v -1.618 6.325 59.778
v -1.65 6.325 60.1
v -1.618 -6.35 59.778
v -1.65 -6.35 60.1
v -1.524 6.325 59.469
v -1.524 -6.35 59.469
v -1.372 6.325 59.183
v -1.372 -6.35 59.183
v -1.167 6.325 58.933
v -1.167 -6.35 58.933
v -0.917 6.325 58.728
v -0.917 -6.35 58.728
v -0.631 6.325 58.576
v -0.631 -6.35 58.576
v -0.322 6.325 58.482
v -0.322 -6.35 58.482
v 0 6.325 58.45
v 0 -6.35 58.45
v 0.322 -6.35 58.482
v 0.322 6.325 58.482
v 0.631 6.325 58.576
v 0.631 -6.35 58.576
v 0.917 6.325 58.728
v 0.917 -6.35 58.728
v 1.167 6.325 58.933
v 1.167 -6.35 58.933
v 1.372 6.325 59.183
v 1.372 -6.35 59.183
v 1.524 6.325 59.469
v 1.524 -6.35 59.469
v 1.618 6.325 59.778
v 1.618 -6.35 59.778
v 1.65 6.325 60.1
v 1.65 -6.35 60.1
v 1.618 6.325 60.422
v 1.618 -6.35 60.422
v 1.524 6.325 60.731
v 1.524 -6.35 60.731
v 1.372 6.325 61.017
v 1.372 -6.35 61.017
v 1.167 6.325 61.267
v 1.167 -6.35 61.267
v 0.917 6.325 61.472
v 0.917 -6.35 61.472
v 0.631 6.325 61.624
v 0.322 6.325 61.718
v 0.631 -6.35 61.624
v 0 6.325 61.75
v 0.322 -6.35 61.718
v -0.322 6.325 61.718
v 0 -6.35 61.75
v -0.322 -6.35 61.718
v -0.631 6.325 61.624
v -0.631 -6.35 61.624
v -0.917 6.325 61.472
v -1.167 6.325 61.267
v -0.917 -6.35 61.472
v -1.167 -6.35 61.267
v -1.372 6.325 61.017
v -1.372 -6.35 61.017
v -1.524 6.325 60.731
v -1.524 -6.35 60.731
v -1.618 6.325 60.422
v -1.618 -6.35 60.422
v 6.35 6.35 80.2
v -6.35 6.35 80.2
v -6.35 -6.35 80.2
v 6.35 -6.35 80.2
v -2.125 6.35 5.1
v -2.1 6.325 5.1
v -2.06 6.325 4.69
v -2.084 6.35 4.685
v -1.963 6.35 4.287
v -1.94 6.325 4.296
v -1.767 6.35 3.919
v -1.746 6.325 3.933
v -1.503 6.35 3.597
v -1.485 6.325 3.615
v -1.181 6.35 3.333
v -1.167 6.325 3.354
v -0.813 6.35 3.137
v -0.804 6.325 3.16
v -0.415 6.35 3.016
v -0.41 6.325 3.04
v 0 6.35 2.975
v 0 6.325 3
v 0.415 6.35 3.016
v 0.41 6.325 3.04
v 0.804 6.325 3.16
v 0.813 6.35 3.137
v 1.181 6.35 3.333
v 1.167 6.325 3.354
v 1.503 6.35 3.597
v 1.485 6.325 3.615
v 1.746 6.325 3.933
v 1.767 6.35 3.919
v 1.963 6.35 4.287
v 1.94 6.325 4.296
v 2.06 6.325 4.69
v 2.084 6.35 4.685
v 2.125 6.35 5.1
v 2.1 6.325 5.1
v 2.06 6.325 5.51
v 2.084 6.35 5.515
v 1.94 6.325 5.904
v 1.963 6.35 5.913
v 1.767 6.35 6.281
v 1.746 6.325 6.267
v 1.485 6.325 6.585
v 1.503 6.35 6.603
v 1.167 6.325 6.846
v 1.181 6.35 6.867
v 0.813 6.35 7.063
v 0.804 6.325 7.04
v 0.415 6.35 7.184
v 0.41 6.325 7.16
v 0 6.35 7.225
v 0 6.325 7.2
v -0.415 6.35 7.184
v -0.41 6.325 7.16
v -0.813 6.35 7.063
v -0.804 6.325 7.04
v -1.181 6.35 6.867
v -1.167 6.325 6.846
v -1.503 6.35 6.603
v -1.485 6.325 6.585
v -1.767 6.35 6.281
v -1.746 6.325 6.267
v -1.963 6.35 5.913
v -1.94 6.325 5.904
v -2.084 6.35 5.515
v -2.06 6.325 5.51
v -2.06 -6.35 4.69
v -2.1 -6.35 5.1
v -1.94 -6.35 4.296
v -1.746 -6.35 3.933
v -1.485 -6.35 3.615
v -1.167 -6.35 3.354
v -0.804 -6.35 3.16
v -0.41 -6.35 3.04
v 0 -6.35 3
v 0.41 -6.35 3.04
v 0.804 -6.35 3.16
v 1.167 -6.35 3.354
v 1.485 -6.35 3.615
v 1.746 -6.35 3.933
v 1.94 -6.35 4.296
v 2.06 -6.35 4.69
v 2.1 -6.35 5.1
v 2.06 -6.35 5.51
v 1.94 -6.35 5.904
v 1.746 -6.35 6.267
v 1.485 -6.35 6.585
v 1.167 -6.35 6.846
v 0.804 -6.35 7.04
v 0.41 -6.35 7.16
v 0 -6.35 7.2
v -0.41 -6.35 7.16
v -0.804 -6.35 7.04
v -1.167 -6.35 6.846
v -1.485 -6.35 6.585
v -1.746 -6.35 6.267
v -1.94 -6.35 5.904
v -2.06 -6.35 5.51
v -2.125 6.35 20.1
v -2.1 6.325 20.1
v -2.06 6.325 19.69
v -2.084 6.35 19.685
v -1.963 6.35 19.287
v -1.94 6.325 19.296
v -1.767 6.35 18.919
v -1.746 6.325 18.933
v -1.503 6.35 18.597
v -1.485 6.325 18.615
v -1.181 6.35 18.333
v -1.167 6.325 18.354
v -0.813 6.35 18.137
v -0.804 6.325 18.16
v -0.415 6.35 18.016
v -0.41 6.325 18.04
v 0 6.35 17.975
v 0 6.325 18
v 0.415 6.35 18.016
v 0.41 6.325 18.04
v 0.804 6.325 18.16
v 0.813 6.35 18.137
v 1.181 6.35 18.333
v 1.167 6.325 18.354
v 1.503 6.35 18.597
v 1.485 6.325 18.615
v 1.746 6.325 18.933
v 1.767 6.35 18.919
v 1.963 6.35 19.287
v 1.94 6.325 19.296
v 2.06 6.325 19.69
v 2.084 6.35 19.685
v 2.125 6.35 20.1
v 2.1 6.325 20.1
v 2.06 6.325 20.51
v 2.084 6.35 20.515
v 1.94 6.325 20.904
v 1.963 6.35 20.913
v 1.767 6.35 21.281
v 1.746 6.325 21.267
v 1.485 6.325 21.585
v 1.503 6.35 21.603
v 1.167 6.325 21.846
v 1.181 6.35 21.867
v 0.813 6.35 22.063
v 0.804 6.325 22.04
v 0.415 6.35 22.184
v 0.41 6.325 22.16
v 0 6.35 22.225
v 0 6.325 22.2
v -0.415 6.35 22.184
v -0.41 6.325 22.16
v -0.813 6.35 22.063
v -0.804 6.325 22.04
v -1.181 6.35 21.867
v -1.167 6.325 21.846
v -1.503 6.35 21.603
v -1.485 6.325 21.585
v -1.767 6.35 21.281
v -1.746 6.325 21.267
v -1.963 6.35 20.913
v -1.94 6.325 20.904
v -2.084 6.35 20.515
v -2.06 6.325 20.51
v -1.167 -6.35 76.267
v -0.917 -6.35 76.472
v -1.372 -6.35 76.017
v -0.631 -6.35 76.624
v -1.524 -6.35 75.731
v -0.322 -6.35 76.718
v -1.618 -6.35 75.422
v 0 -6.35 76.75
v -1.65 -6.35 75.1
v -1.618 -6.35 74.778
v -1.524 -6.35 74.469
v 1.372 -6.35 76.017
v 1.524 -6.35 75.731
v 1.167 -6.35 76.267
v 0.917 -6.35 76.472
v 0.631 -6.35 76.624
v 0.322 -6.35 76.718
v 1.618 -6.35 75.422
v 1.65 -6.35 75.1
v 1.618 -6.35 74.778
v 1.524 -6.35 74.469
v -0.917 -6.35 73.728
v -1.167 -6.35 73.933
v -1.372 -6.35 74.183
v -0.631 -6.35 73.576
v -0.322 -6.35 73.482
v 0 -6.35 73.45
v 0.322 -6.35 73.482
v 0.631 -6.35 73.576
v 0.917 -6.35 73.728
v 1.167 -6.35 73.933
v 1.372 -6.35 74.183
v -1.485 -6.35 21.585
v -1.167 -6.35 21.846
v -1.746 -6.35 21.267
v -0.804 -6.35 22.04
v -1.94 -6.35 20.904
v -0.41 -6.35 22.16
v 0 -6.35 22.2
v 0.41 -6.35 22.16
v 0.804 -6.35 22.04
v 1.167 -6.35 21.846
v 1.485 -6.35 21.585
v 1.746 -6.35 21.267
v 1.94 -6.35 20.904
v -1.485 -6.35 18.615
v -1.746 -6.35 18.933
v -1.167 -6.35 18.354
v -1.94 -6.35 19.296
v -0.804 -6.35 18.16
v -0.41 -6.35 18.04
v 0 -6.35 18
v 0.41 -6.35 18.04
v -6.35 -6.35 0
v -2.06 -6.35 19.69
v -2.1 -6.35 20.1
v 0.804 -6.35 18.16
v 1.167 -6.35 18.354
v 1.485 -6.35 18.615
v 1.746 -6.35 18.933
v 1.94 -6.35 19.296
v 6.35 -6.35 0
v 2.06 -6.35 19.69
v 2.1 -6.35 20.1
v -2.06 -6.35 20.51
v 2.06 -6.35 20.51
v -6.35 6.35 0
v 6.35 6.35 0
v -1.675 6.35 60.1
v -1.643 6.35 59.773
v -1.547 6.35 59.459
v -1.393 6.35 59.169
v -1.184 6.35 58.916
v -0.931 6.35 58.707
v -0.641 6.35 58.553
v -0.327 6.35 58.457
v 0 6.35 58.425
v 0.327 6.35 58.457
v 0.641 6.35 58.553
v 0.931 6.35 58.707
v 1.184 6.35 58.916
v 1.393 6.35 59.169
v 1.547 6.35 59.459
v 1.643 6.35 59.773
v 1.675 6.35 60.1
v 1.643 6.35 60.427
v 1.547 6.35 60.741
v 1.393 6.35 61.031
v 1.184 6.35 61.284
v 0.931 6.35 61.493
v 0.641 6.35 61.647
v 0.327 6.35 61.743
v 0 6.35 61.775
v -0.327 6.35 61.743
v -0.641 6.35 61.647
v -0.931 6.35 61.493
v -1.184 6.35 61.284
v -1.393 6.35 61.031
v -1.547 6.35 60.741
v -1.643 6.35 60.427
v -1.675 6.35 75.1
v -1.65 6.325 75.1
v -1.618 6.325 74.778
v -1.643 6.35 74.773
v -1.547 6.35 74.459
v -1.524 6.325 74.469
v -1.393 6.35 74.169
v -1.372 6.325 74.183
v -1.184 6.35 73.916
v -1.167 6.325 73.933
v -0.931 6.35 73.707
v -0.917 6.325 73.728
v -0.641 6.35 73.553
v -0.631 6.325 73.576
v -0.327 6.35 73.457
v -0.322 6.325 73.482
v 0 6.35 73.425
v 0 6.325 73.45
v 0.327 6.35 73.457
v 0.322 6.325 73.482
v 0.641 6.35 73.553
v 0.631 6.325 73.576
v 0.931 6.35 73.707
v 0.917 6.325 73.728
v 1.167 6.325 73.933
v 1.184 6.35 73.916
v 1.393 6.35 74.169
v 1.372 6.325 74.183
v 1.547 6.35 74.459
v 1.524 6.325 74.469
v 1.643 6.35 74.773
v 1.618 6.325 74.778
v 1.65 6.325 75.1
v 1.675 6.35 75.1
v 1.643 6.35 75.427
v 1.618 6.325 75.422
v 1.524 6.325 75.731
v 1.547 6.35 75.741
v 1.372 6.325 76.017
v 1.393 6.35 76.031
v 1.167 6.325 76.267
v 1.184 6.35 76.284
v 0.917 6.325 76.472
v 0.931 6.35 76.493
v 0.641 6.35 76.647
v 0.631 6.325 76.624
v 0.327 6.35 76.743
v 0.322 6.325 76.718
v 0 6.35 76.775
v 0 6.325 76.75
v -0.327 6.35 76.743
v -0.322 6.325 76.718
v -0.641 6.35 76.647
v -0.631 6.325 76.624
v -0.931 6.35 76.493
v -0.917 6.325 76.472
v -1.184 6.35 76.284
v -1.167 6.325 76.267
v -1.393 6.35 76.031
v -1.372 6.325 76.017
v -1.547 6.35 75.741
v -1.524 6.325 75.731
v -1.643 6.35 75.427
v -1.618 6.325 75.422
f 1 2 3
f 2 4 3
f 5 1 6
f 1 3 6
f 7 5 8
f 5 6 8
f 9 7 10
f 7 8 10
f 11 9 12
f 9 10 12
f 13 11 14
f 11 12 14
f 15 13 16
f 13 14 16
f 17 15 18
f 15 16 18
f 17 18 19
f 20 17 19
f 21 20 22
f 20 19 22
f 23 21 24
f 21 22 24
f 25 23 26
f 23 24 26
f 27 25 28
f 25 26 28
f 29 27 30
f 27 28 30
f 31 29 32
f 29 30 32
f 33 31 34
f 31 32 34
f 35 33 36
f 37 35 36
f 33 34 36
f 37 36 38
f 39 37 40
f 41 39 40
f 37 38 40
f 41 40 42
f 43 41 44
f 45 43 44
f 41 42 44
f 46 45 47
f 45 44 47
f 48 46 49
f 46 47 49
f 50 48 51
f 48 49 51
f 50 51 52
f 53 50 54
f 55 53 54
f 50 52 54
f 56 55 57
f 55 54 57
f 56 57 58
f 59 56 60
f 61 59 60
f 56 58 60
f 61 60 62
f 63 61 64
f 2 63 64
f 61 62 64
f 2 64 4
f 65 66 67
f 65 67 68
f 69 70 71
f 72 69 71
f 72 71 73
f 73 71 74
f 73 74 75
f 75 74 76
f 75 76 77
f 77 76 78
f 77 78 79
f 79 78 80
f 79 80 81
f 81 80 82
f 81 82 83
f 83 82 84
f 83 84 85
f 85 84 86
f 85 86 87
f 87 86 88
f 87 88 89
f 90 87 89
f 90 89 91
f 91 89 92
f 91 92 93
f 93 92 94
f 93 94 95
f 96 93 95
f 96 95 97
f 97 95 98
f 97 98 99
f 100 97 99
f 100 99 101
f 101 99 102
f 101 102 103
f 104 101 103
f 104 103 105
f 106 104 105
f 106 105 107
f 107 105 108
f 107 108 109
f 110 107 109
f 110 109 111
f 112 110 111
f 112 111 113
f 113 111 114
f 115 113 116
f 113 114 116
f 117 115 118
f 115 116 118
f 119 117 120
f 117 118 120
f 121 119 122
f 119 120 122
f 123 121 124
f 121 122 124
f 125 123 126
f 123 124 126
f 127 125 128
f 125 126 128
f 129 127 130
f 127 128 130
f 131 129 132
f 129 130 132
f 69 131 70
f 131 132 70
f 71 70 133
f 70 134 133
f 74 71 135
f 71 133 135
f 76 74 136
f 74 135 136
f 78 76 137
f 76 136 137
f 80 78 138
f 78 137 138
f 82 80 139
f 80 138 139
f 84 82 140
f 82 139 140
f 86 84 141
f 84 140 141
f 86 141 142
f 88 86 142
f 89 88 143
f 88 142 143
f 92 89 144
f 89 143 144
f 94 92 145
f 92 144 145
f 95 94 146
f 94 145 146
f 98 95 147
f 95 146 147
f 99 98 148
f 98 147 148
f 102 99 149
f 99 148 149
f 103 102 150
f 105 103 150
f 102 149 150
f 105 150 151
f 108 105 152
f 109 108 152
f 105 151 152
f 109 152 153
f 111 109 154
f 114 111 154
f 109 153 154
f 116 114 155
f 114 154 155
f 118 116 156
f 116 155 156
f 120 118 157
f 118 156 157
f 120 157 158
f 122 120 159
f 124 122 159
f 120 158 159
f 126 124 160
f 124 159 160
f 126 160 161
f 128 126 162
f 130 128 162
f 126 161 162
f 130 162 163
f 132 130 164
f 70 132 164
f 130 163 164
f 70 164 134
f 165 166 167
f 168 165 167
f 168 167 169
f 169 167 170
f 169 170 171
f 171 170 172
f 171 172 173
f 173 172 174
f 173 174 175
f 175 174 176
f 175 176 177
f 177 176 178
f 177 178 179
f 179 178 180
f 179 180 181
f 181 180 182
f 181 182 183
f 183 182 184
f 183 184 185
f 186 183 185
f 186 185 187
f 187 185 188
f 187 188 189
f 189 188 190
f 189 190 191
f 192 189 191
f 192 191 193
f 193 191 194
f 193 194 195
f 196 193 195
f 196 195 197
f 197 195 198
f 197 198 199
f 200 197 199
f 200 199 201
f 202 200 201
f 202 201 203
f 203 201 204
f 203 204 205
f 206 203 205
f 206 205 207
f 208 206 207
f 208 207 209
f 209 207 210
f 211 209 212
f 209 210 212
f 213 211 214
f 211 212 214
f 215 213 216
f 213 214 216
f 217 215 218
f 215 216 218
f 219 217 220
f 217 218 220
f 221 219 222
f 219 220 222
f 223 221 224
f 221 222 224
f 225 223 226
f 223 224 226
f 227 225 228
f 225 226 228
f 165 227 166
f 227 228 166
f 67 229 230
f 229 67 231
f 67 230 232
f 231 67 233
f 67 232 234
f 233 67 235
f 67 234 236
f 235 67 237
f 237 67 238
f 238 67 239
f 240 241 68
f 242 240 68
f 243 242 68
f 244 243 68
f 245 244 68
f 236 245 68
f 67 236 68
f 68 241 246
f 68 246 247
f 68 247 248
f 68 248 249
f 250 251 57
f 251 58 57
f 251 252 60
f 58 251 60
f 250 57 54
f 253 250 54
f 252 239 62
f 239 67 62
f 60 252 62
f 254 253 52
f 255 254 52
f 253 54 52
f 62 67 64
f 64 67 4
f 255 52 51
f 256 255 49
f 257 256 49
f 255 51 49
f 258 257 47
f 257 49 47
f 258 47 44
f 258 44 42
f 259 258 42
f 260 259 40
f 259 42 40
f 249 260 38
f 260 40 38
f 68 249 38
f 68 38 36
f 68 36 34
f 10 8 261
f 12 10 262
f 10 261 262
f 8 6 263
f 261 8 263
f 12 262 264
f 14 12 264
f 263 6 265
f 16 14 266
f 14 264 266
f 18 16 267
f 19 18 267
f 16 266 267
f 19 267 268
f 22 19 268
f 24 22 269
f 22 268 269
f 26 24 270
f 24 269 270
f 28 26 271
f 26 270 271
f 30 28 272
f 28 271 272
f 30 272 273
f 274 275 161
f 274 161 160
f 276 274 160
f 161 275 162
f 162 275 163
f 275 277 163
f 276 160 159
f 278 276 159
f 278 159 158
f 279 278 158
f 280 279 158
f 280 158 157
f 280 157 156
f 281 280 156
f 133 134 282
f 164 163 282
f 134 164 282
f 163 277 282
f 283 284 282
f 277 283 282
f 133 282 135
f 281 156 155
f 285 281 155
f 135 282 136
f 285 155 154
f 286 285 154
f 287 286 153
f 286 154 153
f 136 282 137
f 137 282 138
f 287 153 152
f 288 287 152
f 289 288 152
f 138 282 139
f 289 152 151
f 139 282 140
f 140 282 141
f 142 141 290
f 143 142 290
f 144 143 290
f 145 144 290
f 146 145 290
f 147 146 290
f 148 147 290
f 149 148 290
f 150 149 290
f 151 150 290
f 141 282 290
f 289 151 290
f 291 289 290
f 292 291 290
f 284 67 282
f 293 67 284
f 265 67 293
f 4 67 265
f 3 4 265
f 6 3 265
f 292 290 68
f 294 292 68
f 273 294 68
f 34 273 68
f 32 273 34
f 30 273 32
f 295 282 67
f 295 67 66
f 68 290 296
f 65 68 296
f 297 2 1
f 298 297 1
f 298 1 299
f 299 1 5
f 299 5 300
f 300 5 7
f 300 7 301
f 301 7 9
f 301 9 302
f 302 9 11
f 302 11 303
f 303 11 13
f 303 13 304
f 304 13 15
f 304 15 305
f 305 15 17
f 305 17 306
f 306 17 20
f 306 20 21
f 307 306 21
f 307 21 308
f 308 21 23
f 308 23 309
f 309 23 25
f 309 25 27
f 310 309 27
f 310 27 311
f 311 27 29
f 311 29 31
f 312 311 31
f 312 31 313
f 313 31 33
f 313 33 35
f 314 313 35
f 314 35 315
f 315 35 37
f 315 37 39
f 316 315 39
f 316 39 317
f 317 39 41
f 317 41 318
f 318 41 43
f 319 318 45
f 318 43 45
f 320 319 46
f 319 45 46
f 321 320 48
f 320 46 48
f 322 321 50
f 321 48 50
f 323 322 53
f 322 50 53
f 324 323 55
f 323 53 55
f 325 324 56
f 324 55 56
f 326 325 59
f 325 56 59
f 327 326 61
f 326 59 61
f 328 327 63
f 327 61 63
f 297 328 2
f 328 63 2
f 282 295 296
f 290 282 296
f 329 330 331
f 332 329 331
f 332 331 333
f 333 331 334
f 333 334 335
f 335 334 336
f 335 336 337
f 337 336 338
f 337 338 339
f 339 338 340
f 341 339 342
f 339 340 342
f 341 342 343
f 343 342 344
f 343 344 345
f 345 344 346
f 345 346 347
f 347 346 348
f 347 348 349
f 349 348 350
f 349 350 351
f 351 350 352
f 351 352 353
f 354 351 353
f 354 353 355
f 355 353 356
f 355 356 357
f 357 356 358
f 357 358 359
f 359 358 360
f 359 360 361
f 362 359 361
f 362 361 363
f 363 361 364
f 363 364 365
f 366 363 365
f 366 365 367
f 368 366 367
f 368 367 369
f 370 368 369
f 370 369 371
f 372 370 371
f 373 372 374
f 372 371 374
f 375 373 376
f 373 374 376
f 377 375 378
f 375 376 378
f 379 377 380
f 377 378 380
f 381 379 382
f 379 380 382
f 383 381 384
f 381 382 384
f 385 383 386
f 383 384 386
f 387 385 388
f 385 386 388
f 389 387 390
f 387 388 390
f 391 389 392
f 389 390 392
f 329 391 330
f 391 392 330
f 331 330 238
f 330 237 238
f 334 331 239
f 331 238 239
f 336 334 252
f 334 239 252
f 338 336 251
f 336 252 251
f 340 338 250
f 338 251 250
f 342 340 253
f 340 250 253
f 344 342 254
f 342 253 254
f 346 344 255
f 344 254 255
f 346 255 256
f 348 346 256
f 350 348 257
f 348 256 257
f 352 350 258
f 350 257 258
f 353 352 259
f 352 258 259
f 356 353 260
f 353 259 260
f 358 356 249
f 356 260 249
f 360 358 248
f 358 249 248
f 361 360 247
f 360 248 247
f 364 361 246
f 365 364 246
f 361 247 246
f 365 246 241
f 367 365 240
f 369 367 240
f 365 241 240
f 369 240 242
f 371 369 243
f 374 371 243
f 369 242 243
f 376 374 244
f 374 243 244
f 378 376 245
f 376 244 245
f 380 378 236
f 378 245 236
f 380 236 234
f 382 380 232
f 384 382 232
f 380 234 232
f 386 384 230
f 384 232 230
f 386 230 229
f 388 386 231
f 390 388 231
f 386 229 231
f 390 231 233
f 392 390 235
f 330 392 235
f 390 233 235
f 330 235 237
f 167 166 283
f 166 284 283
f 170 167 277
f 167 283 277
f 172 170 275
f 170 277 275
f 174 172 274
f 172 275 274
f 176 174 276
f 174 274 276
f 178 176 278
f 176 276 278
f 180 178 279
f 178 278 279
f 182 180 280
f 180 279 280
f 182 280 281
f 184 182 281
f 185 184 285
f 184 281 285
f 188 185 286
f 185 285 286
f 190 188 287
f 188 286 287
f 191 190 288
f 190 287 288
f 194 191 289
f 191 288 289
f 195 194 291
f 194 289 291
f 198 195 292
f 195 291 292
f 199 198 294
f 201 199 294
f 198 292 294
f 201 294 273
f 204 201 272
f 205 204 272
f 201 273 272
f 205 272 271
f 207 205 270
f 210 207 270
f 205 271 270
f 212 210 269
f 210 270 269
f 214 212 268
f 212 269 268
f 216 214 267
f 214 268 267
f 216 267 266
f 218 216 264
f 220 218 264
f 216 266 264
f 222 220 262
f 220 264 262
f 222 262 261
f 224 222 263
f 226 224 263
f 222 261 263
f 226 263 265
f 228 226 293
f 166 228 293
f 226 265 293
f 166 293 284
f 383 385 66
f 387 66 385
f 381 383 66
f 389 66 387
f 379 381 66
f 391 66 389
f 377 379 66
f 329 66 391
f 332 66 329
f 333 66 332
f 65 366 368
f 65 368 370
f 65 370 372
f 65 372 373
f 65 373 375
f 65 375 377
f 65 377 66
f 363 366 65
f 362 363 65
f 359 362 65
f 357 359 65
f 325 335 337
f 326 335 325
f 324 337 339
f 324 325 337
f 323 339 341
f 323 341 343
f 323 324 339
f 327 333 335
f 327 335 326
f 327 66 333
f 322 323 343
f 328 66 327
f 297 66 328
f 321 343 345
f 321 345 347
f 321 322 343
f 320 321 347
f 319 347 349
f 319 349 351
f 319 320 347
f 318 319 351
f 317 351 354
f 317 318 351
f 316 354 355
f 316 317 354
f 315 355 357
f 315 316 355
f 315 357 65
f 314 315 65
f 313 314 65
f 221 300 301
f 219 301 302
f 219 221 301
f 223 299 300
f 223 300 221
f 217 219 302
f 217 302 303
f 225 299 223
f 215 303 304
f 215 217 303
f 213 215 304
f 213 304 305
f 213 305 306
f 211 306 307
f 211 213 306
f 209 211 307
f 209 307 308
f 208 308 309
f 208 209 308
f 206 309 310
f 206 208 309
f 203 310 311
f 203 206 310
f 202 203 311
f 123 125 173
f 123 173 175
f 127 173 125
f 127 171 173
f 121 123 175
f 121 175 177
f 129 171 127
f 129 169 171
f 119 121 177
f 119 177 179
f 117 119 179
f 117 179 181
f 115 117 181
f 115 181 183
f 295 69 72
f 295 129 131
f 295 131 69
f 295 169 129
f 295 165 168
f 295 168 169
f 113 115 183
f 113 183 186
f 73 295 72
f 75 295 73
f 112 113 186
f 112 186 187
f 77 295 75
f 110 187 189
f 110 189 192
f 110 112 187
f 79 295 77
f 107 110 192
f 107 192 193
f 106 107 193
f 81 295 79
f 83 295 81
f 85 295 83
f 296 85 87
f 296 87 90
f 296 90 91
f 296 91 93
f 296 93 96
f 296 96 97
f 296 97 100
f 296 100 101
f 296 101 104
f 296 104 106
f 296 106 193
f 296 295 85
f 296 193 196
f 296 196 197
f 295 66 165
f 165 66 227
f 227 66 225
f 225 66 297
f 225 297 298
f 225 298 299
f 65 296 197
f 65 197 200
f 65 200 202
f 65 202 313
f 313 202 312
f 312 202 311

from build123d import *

# Parameters (mm, degrees)
SKETCH_1_W                   = 12.7
SKETCH_1_H                   = 12.7
EXTRUDE_1_DEPTH              = 80.2
HOLE_WIZARD_M4_1_D           = 3.3
HOLE_WIZARD_M4_1_CSINK_D     = 3.35
HOLE_WIZARD_M4_1_CSINK_ANGLE = 90
HOLE_WIZARD_M5_1_D           = 4.2
HOLE_WIZARD_M5_1_CSINK_D     = 4.25
HOLE_WIZARD_M5_1_CSINK_ANGLE = 90


with BuildPart() as part:
    # 草圖1 → 填料-伸長1 (new body)
    with BuildSketch(Plane.XY):
        Rectangle(SKETCH_1_W, SKETCH_1_H)
    extrude(amount=EXTRUDE_1_DEPTH)

    # M4  螺絲攻的螺孔鑽1 (through all)
    with Locations(Plane(origin=(0, 6.35, 0), x_dir=(1, 0, 0), z_dir=(0, 1, 0))):
        with Locations((0, -60.1), (0, -75.1)):
            CounterSinkHole(HOLE_WIZARD_M4_1_D / 2, HOLE_WIZARD_M4_1_CSINK_D / 2, counter_sink_angle=HOLE_WIZARD_M4_1_CSINK_ANGLE)

    # M5  螺絲攻的螺孔鑽1 (through all)
    with Locations(Plane(origin=(0, 6.35, 0), x_dir=(1, 0, 0), z_dir=(0, 1, 0))):
        with Locations((0, -5.1), (0, -20.1)):
            CounterSinkHole(HOLE_WIZARD_M5_1_D / 2, HOLE_WIZARD_M5_1_CSINK_D / 2, counter_sink_angle=HOLE_WIZARD_M5_1_CSINK_ANGLE)


solid = part.part
